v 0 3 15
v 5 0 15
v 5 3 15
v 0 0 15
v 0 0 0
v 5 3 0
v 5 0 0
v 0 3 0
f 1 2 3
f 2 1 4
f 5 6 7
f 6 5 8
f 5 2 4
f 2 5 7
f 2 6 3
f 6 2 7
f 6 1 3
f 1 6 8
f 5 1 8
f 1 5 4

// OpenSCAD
// Generated by SolidPython 1.0.1 on 2020-07-29 00:46:54


cube(size = [5, 3, 15]);
/***********************************************
*********      SolidPython code:      **********
************************************************
 
# import packages: SolidPython
from solid import *
from solid.utils import *
from itertools import chain, combinations, permutations


class Resize:

    def __init__(self, scad_file):
        self.scad_file = scad_file
        #self.scad_file = import_scad(scad_file)
        # cone/cylinder param:
        self.r1 = 0
        self.r2 = 0
        self.h = 0
        # rectangular prism param:
        self.w = 0
        self.l = 0
        # ellipse param:
        self.r = 0

    # import OpenScad code (file name corresponds to shape)


    # classify shape + parameters
    def assign(self, param1, param2, param3):
        if self.scad_file == 'cone.scad':
            self.r1 = param1
            self.r2 = param2
            self.h = param3
        elif self.scad_file == 'cylinder.scad':
            self.r1 = param1
            self.r2 = param2
            self.h = param3
        elif self.scad_file == 'rectangularPrism.scad':
            self.h = param1
            self.l = param2
            self.w = param3
        else:
            self.r = param1
            self.h = param2

    # resize parameters
    def iterate(self):
        x = range(3, 20, 2)
        i = 1
        if self.scad_file == 'cone.scad':
            tempList = list(permutations(x, 2))
            for temp in tempList:
                param1 = temp[0]
                param2 = temp[1]
                filepath = 'produced_scad_files/' + 'cone' + str(param1) + '_' + str(param2) + '_' + '.scad'
                scad_render_to_file(cylinder(h=param1, r1=param2, r2=0), filepath)

        elif self.scad_file == 'cylinder.scad':
            tempList = list(permutations(x, 3))
            for temp in tempList:
                param1 = temp[0]
                param2 = temp[1]
                filepath = 'produced_scad_files/' + 'cylinder' + str(param1) + '_' + str(param2) + '_' + '.scad'
                scad_render_to_file(cylinder(h=param1, r1=param2, r2=param2), filepath)

        elif self.scad_file == 'rectangularPrism.scad':
            tempList = list(permutations(x, 3))
            for temp in tempList:
                param1 = temp[0]
                param2 = temp[1]
                param3 = temp[2]
                filepath = 'produced_scad_files/' + 'rectangularPrism' + str(param1) + '_' + str(param2) + '_' + str(
                    param3) + '.scad'
                scad_render_to_file(cube(size=(param1, param2, param3)), filepath)

        elif self.scad_file == 'ellipse.scad':
            tempList = list(permutations(x, 4))
            for temp in tempList:
                param1 = temp[0]
                param2 = temp[1]
                param3 = temp[2]
                param4 = temp[3]
                filepath = 'produced_scad_files/' + 'ellipse' + str(param1) + '_' + str(param2) + '_' + str(param3) + '_' + str(param4) + '.scad'
                scad_render_to_file(scale([param1, param2, param3])(sphere(r=param4)), filepath)

    def render_to_scadfile(self):
        scad_render_to_file(scad, 'example.scad') 
 
************************************************/
